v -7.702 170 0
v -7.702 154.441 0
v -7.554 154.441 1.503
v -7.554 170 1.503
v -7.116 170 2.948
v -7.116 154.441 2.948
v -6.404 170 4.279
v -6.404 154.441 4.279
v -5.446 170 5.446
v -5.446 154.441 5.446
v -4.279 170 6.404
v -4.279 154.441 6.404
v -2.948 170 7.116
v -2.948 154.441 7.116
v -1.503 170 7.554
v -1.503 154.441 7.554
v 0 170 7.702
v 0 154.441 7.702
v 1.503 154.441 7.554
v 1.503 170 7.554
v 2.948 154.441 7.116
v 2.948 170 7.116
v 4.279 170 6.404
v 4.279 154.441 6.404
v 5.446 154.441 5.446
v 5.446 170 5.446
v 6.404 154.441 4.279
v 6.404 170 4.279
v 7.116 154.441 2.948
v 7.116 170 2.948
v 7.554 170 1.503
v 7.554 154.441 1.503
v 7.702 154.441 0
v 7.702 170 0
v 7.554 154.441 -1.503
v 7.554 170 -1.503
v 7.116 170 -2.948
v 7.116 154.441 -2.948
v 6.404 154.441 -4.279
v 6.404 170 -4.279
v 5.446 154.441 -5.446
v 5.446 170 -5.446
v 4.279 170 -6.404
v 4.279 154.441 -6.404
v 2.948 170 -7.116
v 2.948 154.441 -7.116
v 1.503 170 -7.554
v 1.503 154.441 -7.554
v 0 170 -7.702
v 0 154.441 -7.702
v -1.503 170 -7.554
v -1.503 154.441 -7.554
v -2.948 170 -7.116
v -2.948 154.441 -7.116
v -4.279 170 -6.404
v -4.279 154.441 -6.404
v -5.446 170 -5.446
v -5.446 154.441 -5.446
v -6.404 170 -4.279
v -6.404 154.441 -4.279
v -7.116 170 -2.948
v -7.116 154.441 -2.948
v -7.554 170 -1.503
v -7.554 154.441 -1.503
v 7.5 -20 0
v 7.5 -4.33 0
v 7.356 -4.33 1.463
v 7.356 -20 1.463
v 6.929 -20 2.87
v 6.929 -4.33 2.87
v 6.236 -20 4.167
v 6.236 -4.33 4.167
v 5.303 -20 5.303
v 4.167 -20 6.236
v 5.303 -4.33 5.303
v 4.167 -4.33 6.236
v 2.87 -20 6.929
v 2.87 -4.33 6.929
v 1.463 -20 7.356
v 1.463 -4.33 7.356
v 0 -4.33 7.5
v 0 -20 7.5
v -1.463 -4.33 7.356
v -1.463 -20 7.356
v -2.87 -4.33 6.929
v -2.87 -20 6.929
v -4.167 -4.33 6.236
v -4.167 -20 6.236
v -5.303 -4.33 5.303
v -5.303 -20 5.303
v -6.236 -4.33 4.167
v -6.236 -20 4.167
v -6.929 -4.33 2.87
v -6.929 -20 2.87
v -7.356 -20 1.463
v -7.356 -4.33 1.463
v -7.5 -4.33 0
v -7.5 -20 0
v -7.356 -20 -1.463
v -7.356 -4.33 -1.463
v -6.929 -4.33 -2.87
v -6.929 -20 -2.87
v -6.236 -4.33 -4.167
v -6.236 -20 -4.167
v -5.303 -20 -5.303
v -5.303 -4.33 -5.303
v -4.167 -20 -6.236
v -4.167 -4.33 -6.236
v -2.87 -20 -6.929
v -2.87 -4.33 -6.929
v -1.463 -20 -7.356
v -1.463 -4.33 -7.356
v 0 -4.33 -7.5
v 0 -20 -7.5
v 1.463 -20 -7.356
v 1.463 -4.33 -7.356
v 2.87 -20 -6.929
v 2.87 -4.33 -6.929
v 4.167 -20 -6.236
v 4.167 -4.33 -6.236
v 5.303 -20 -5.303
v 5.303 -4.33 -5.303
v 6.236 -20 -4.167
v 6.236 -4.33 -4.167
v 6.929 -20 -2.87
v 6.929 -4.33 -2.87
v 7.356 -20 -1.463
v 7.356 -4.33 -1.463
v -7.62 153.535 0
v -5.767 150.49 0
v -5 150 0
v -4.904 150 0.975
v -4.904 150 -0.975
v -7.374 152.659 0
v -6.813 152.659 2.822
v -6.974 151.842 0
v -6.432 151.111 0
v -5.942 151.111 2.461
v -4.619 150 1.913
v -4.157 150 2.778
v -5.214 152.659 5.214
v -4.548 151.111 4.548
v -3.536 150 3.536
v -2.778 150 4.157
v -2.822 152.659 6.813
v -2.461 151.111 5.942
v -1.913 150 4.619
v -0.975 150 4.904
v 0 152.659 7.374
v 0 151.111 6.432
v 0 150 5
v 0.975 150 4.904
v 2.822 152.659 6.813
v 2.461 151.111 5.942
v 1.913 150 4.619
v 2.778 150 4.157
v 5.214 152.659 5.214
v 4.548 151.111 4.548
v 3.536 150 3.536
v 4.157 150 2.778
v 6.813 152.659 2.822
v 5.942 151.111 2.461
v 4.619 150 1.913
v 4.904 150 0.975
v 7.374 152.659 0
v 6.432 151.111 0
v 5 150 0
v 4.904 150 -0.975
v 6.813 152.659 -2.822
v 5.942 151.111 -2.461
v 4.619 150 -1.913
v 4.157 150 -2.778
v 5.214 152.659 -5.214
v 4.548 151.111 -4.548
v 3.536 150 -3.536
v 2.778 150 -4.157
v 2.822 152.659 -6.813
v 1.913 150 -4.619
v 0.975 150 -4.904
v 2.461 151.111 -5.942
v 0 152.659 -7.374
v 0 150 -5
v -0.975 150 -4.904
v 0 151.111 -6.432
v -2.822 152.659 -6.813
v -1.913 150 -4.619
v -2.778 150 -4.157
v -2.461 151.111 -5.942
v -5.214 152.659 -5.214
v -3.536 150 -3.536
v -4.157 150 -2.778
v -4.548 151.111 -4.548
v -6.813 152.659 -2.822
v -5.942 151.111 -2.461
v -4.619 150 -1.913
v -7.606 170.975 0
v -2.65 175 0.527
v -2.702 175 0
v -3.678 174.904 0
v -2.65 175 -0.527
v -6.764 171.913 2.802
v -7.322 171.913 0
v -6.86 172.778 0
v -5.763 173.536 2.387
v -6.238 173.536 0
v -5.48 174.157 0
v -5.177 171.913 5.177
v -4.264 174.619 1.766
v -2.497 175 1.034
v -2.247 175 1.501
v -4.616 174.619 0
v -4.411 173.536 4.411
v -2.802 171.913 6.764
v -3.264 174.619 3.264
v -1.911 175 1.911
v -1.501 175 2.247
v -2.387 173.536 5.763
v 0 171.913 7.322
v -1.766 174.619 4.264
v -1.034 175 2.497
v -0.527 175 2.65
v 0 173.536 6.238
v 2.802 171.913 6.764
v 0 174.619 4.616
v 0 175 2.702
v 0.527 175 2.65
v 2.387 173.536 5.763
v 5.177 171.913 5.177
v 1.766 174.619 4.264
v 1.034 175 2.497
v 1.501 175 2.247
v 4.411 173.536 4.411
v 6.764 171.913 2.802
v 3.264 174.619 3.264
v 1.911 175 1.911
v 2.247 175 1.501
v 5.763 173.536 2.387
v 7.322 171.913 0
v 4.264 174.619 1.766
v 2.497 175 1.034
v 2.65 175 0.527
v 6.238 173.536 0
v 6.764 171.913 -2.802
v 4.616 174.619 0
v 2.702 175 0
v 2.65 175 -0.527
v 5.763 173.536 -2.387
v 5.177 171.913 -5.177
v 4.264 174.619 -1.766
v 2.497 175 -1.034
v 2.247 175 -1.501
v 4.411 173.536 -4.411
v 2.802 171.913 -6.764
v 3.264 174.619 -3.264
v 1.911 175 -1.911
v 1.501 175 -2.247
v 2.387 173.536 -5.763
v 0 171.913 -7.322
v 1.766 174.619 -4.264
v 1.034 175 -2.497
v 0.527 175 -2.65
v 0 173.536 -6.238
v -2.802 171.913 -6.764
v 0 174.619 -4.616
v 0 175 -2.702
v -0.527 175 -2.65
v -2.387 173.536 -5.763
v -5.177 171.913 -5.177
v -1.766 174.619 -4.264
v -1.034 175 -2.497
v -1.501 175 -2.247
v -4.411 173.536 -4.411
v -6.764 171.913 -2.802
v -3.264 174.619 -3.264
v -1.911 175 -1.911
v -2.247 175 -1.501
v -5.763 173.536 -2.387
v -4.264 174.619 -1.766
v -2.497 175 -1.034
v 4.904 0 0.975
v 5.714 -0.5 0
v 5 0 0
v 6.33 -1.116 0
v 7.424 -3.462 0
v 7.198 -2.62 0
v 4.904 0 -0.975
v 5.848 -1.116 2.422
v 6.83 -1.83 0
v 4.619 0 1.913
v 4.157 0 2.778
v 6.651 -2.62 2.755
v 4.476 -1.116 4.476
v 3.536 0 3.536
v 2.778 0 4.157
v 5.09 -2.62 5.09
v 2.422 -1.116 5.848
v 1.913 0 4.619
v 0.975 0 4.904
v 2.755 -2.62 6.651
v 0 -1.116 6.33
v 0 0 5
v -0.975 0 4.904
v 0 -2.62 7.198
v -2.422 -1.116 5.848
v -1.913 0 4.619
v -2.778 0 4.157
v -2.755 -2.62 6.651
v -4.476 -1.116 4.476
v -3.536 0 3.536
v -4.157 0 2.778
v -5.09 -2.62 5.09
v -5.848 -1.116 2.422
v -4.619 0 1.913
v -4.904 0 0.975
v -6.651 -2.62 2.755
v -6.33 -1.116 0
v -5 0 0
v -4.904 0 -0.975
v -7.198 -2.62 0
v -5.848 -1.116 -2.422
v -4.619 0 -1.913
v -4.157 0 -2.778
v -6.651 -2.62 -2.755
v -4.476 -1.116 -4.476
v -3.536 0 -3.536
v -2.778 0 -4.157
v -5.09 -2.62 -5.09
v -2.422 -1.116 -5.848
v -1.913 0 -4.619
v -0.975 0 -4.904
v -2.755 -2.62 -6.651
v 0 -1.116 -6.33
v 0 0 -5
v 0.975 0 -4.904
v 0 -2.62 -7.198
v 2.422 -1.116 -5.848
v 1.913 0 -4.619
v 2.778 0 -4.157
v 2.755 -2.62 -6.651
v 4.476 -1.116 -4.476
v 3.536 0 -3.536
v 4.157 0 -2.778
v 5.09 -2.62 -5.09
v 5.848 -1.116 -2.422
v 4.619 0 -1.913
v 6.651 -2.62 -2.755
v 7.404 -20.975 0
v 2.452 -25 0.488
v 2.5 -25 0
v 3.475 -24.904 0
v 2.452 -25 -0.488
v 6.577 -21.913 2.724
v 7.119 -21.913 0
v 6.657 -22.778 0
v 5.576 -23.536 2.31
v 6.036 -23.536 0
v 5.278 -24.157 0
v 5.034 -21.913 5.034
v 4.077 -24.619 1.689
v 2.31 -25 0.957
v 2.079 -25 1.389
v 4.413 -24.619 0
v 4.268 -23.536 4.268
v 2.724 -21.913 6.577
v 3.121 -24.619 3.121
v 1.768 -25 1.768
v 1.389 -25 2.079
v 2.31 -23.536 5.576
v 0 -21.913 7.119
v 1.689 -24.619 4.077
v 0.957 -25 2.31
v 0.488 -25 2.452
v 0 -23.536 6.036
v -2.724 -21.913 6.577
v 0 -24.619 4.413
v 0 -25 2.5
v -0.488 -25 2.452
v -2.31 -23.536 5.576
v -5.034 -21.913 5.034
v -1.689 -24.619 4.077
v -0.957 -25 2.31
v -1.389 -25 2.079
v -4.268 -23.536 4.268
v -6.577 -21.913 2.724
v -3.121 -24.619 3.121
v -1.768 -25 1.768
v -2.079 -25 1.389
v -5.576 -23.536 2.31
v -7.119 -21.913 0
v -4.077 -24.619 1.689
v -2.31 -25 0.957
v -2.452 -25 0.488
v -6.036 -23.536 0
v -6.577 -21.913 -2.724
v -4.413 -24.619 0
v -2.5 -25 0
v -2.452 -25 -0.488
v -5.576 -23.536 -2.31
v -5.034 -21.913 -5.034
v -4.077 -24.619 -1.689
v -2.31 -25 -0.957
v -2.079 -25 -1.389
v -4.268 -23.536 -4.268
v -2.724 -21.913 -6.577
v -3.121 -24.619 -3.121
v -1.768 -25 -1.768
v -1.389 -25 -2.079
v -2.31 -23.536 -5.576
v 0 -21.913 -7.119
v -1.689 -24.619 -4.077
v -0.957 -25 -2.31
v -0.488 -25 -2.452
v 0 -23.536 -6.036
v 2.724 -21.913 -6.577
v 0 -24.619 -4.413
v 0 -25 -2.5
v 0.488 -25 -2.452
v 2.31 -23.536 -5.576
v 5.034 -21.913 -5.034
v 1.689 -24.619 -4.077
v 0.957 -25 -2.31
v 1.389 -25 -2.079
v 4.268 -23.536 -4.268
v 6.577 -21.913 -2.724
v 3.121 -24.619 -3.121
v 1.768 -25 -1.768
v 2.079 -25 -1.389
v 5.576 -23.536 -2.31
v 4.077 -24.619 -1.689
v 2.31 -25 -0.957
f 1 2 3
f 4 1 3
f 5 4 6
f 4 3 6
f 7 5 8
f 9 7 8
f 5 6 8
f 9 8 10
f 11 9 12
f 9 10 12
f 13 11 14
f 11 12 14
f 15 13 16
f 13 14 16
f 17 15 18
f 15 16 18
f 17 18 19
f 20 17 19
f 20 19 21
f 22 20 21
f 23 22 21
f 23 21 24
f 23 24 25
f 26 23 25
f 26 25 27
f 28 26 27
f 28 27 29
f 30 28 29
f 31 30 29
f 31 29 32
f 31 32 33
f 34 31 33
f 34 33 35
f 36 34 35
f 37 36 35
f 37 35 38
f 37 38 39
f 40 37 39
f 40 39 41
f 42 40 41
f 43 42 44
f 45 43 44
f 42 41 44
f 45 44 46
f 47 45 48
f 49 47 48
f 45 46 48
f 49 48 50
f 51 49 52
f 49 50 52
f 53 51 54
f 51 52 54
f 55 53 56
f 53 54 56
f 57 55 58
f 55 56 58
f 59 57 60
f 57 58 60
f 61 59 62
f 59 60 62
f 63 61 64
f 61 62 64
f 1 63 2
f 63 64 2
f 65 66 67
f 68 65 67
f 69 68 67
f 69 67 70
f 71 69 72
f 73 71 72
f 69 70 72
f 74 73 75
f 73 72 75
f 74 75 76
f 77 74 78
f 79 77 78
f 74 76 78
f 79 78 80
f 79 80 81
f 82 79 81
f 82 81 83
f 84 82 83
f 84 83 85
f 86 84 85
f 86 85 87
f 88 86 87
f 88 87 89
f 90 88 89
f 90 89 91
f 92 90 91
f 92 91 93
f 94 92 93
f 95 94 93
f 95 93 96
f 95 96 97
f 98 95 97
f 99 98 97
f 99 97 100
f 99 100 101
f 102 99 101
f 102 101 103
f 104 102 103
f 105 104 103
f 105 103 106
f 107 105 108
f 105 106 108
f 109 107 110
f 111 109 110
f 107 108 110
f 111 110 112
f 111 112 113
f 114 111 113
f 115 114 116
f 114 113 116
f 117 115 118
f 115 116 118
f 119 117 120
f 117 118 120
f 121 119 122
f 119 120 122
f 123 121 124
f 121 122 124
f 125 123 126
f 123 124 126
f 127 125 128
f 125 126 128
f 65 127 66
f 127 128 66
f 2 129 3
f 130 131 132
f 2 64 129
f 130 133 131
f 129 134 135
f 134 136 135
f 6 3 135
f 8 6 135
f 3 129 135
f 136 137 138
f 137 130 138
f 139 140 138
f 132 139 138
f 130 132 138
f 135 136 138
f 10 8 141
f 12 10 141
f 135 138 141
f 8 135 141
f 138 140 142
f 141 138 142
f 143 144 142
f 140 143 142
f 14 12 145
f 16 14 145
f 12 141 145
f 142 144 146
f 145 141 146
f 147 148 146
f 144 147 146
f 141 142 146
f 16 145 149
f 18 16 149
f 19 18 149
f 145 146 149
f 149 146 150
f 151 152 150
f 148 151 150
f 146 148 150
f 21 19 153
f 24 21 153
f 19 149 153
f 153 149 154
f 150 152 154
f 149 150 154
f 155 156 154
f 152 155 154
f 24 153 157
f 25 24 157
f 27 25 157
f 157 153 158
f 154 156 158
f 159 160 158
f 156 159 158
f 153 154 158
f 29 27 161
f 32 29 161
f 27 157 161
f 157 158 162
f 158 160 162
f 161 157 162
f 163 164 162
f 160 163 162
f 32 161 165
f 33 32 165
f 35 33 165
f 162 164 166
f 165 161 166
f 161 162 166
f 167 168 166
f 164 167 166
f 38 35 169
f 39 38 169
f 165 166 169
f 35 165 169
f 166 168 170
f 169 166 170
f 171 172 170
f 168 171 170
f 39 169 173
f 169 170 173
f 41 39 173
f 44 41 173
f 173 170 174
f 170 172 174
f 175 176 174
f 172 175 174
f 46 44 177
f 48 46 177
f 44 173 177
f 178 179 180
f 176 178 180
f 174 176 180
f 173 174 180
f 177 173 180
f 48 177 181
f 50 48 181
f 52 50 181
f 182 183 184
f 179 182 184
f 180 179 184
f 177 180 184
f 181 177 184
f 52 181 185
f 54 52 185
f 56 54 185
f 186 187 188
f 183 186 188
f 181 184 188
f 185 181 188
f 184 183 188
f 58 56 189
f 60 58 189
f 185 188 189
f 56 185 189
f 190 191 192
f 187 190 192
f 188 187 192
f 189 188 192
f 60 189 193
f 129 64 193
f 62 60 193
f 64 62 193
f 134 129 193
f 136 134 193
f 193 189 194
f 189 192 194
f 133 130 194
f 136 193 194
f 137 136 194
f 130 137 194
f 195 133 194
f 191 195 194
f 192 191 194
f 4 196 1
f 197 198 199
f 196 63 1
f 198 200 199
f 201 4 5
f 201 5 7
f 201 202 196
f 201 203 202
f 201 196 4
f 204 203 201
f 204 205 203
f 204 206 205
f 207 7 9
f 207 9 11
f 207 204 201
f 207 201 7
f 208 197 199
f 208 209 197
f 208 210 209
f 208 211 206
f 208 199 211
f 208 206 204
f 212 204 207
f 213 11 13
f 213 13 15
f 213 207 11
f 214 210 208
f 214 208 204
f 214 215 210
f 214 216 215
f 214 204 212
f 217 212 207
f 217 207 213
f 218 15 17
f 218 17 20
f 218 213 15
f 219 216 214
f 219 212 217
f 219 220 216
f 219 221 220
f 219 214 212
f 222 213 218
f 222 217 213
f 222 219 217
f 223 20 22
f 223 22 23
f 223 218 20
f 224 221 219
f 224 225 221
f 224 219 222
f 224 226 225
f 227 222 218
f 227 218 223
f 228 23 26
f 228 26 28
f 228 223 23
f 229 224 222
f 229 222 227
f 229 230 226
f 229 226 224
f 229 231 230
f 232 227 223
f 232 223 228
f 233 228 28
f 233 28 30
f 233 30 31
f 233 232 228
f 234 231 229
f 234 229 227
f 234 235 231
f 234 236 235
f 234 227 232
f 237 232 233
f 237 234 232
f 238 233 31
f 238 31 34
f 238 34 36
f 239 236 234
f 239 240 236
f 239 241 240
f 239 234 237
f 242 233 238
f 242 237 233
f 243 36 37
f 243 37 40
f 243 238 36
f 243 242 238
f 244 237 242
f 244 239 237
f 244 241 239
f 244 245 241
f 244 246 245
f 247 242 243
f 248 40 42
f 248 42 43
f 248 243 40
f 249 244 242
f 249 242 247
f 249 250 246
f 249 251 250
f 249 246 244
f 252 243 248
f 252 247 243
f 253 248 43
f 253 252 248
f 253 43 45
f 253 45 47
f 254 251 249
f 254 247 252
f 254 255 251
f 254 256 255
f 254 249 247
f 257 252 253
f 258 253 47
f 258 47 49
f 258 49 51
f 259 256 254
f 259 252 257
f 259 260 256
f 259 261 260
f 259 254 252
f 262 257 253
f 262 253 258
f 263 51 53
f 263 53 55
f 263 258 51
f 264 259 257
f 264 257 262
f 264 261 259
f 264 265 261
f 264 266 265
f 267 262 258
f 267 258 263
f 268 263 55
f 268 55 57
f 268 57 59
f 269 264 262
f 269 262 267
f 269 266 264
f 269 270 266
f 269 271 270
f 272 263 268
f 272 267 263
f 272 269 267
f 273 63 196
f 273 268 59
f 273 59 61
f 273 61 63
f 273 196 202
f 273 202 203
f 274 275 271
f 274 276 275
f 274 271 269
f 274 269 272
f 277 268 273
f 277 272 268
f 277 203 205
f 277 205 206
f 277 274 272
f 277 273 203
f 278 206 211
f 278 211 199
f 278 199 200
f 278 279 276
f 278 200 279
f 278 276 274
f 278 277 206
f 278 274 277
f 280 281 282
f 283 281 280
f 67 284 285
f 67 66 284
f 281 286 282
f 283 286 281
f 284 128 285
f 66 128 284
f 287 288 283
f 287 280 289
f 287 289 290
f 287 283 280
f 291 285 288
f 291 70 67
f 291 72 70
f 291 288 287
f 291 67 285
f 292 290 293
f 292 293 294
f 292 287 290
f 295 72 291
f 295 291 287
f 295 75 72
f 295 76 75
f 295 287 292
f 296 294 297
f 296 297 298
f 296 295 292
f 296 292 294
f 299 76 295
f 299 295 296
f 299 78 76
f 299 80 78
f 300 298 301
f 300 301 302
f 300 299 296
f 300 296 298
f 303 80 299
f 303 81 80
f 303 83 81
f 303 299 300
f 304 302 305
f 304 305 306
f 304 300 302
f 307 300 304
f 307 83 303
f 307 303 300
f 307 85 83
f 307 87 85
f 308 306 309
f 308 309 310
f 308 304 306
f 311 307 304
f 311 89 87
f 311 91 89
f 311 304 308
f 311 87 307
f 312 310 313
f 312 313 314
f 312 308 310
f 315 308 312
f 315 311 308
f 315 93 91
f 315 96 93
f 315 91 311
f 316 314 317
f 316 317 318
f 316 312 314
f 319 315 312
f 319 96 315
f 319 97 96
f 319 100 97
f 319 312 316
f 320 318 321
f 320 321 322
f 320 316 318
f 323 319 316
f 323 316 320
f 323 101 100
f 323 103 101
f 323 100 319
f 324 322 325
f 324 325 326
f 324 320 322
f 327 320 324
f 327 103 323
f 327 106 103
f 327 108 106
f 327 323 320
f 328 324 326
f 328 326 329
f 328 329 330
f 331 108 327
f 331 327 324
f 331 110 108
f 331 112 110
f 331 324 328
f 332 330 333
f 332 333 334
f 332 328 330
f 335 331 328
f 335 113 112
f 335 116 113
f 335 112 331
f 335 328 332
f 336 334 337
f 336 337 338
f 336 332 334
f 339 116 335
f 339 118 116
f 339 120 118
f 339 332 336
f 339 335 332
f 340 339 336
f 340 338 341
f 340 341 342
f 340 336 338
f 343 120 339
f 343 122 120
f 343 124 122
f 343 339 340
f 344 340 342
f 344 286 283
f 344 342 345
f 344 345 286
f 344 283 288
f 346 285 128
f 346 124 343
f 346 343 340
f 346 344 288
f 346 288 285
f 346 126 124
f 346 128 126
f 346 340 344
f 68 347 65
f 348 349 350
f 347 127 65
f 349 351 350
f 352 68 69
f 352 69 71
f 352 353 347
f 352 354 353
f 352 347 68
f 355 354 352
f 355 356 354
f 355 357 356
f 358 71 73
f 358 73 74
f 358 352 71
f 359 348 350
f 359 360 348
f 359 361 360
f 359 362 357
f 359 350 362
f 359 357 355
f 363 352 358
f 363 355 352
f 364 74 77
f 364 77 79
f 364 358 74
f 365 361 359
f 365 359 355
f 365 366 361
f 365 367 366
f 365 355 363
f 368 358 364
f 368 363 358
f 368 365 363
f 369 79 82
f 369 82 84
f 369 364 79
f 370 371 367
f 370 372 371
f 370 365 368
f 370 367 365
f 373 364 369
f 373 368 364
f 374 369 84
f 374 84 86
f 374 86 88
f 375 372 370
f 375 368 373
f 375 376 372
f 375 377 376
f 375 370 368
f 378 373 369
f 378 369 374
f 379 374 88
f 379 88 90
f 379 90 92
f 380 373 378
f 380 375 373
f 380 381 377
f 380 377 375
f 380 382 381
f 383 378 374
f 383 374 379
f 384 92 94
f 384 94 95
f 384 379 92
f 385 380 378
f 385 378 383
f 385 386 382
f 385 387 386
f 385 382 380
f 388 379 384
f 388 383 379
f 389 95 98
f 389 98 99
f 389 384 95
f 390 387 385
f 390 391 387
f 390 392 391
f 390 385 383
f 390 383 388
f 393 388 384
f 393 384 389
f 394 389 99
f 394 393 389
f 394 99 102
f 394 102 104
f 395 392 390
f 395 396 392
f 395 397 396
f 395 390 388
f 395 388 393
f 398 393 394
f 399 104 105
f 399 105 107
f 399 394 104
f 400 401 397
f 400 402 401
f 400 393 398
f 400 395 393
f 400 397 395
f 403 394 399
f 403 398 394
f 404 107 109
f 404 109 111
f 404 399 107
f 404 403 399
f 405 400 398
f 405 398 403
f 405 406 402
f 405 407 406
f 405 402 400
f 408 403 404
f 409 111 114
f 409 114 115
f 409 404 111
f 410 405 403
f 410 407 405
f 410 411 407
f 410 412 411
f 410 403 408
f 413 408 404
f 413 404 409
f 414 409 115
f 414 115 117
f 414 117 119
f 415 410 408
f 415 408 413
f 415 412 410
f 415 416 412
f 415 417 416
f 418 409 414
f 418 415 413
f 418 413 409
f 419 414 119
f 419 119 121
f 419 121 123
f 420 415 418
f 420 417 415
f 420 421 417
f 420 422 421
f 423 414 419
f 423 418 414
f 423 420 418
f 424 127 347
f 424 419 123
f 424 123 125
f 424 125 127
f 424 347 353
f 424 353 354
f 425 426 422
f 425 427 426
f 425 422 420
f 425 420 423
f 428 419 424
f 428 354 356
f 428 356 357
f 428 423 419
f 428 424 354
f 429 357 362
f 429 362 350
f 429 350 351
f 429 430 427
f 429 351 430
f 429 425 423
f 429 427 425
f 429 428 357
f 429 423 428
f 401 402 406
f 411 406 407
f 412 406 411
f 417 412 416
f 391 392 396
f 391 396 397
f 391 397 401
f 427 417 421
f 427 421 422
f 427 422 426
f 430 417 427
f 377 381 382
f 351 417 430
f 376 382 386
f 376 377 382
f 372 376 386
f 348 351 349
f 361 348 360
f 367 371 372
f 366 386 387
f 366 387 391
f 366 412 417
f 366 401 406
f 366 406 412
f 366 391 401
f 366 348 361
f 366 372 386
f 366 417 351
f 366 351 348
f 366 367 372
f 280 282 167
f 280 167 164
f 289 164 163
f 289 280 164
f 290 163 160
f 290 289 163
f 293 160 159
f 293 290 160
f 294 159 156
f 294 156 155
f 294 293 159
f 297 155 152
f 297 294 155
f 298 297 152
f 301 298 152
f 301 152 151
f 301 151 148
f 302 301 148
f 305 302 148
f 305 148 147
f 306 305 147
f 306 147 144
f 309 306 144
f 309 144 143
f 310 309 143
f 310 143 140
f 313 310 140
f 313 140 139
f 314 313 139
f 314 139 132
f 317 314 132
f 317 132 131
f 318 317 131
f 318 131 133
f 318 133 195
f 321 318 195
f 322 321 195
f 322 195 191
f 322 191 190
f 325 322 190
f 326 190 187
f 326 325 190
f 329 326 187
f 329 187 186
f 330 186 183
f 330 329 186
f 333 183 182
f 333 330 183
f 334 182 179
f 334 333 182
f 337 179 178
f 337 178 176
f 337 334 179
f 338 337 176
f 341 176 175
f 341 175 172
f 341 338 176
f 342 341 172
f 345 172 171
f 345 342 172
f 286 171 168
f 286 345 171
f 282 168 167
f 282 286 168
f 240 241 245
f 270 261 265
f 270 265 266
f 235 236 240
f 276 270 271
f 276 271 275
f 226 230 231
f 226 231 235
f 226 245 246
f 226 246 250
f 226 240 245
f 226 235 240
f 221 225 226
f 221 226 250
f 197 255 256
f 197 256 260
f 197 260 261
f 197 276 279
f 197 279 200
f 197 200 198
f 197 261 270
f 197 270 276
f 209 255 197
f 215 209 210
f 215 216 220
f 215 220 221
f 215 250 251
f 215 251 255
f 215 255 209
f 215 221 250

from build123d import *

# Parameters (mm, degrees)
F0_R      = 5
F1_DEPTH  = 150
F1_FACE_R = 5
F0_R_2    = 7.5
F2_DEPTH  = 25
F3_R      = 7.7024133884
F3_R_2    = 5
F4_DEPTH  = 25


# Not quite as in the source:
# - a fillet or chamfer that OpenCascade refuses, or shapes differently, is made with other operations: its cross-section is extruded or revolved along the edge and cut away or added


with BuildPart() as f1:
    # F0 (on Front) → F1 (new body)
    with BuildSketch(Plane.XZ):
        Circle(F0_R)
    extrude(amount=-F1_DEPTH)

    # F1_face (on face) + F0 (on Front) → F2 (join)
    with BuildSketch(Plane.XZ):
        Circle(F1_FACE_R)
    with BuildSketch(Plane.XZ):
        Circle(F0_R_2)
        Circle(F0_R, mode=Mode.SUBTRACT)
    extrude(amount=F2_DEPTH)

    # F3 (on face) → F4 (join)
    with BuildSketch(Plane(origin=(0, 150, 0), x_dir=(-1, 0, 0), z_dir=(0, 1, 0))):
        Circle(F3_R)
        Circle(F3_R_2, mode=Mode.SUBTRACT)
        Circle(F3_R_2)
    extrude(amount=F4_DEPTH)

    # F5: fillet of radius 5 on 4 edges, made by hand

    # F5_s1 → F5_t2 (revolve, cut)
    with BuildSketch(Plane.XY):
        with BuildLine():
            ThreePointArc((7.5, -20), (6.0355339059, -23.5355339059), (2.5, -25))
            Line((2.5, -25), (7.5, -25))
            Line((7.5, -25), (7.5, -20))
        make_face()
    revolve(axis=Axis((0, -25, 0), (0, -1, 0)), mode=Mode.SUBTRACT)

    # F5_s3 → F5_t4 (revolve, cut)
    with BuildSketch(Plane.XY):
        with BuildLine():
            ThreePointArc((5, 0), (6.8301270189, -1.8301270189), (7.5, -4.3301270189))
            Line((7.5, -4.3301270189), (7.5, 0))
            Line((7.5, 0), (5, 0))
        make_face()
    revolve(axis=Axis((0, 0, 0), (0, -1, 0)), mode=Mode.SUBTRACT)

    # F5_s5 → F5_t6 (revolve, cut)
    with BuildSketch(Plane.XY):
        with BuildLine():
            ThreePointArc((-7.7024133884, 170), (-6.2379472943, 173.5355339059), (-2.7024133884, 175))
            Line((-2.7024133884, 175), (-7.7024133884, 175))
            Line((-7.7024133884, 175), (-7.7024133884, 170))
        make_face()
    revolve(axis=Axis((0, 175, 0), (0, 1, 0)), mode=Mode.SUBTRACT)

    # F5_s7 → F5_t8 (revolve, cut)
    with BuildSketch(Plane.XY):
        with BuildLine():
            ThreePointArc((-7.7024133884, 154.4408440371), (-6.9737090383, 151.8416069431), (-5, 150))
            Line((-5, 150), (-7.7024133884, 150))
            Line((-7.7024133884, 150), (-7.7024133884, 154.4408440371))
        make_face()
    revolve(axis=Axis((0, 150, 0), (0, 1, 0)), mode=Mode.SUBTRACT)


solid = f1.part
